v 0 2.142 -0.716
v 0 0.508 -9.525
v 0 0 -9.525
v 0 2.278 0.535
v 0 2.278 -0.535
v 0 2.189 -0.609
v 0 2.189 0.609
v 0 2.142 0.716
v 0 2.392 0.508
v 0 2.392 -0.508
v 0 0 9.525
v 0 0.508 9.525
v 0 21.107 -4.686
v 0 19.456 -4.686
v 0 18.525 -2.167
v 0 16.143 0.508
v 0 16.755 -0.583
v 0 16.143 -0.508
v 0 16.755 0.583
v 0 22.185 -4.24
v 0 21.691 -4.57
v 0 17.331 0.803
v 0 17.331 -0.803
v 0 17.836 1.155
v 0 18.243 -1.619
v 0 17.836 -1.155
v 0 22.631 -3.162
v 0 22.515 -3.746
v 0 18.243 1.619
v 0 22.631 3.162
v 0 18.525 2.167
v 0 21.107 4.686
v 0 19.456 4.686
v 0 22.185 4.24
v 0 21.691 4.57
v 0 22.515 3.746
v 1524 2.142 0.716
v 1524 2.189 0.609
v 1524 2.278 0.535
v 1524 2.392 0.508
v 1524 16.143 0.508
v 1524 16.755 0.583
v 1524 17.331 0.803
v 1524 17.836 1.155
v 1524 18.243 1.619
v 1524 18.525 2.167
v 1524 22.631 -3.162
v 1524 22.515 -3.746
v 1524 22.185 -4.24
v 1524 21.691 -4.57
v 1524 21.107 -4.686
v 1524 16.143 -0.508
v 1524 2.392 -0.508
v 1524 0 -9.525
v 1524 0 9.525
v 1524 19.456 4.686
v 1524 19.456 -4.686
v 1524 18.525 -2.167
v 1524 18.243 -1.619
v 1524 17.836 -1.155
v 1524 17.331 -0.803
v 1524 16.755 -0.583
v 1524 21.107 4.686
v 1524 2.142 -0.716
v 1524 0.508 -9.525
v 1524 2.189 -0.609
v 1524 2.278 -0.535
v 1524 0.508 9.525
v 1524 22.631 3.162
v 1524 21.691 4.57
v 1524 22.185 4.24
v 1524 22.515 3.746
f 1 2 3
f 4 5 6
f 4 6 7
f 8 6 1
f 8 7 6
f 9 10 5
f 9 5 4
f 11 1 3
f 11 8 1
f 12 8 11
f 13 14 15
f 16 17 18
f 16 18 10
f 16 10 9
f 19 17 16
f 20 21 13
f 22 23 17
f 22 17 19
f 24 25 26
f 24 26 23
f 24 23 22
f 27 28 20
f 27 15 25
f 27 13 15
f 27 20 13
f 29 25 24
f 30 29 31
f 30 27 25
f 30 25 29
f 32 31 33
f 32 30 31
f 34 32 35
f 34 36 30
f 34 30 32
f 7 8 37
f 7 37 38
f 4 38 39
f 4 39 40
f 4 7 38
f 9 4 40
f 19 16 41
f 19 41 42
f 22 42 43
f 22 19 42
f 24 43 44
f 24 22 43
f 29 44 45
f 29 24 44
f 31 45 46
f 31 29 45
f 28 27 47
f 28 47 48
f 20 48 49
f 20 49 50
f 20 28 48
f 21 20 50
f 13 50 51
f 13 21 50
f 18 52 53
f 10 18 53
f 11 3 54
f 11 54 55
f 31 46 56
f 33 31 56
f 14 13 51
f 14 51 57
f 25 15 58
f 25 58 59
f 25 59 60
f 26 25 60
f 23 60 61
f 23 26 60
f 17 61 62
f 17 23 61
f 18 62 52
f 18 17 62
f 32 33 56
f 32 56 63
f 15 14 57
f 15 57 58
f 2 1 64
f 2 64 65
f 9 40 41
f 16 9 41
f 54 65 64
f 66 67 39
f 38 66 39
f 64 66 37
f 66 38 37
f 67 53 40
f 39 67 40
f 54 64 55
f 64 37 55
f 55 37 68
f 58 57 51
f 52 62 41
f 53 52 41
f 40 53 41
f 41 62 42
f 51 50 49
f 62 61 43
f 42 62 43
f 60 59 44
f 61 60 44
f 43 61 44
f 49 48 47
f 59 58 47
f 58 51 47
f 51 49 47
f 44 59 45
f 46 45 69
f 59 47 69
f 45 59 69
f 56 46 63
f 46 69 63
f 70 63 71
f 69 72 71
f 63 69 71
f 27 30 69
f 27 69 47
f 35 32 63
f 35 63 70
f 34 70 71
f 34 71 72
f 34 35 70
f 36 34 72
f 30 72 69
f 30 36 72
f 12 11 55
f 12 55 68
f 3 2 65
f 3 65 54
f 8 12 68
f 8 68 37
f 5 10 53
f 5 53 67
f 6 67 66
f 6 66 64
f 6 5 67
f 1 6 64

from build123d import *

# Parameters (mm, degrees)
BOSS_EXTRUDE1_DEPTH = 1524


with BuildPart() as part:
    # Sketch1 → Boss-Extrude1 (new body)
    with BuildSketch(Plane(origin=(0, 0, 0), x_dir=(0, 0, -1), z_dir=(1, 0, 0))):
        with BuildLine():
            Line((9.525, 0), (-9.525, 0))
            Line((-9.525, 0), (-9.525, 0.508))
            Line((-9.525, 0.508), (-0.715679151, 2.141916092))
            ThreePointArc((-0.715679151, 2.141916092), (-0.566703436, 2.229252122), (-0.508, 2.391656716))
            Line((-0.508, 2.391656716), (-0.508, 16.142634631))
            ThreePointArc((-0.508, 16.142634631), (-0.963665934, 17.594237711), (-2.167174412, 18.525017111))
            Line((-2.167174412, 18.525017111), (-4.6863, 19.4564))
            Line((-4.6863, 19.4564), (-4.6863, 21.1074))
            ThreePointArc((-4.6863, 21.1074), (-4.239930735, 22.185030735), (-3.1623, 22.6314))
            Line((-3.1623, 22.6314), (3.1623, 22.6314))
            ThreePointArc((3.1623, 22.6314), (4.239930735, 22.185030735), (4.6863, 21.1074))
            Line((4.6863, 21.1074), (4.6863, 19.4564))
            Line((4.6863, 19.4564), (2.167174412, 18.525017111))
            ThreePointArc((2.167174412, 18.525017111), (0.963665934, 17.594237711), (0.508, 16.142634631))
            Line((0.508, 16.142634631), (0.508, 2.391656716))
            ThreePointArc((0.508, 2.391656716), (0.566703436, 2.229252122), (0.715679151, 2.141916092))
            Line((0.715679151, 2.141916092), (9.525, 0.508))
            Line((9.525, 0.508), (9.525, 0))
        make_face()
    extrude(amount=BOSS_EXTRUDE1_DEPTH)


solid = part.part
